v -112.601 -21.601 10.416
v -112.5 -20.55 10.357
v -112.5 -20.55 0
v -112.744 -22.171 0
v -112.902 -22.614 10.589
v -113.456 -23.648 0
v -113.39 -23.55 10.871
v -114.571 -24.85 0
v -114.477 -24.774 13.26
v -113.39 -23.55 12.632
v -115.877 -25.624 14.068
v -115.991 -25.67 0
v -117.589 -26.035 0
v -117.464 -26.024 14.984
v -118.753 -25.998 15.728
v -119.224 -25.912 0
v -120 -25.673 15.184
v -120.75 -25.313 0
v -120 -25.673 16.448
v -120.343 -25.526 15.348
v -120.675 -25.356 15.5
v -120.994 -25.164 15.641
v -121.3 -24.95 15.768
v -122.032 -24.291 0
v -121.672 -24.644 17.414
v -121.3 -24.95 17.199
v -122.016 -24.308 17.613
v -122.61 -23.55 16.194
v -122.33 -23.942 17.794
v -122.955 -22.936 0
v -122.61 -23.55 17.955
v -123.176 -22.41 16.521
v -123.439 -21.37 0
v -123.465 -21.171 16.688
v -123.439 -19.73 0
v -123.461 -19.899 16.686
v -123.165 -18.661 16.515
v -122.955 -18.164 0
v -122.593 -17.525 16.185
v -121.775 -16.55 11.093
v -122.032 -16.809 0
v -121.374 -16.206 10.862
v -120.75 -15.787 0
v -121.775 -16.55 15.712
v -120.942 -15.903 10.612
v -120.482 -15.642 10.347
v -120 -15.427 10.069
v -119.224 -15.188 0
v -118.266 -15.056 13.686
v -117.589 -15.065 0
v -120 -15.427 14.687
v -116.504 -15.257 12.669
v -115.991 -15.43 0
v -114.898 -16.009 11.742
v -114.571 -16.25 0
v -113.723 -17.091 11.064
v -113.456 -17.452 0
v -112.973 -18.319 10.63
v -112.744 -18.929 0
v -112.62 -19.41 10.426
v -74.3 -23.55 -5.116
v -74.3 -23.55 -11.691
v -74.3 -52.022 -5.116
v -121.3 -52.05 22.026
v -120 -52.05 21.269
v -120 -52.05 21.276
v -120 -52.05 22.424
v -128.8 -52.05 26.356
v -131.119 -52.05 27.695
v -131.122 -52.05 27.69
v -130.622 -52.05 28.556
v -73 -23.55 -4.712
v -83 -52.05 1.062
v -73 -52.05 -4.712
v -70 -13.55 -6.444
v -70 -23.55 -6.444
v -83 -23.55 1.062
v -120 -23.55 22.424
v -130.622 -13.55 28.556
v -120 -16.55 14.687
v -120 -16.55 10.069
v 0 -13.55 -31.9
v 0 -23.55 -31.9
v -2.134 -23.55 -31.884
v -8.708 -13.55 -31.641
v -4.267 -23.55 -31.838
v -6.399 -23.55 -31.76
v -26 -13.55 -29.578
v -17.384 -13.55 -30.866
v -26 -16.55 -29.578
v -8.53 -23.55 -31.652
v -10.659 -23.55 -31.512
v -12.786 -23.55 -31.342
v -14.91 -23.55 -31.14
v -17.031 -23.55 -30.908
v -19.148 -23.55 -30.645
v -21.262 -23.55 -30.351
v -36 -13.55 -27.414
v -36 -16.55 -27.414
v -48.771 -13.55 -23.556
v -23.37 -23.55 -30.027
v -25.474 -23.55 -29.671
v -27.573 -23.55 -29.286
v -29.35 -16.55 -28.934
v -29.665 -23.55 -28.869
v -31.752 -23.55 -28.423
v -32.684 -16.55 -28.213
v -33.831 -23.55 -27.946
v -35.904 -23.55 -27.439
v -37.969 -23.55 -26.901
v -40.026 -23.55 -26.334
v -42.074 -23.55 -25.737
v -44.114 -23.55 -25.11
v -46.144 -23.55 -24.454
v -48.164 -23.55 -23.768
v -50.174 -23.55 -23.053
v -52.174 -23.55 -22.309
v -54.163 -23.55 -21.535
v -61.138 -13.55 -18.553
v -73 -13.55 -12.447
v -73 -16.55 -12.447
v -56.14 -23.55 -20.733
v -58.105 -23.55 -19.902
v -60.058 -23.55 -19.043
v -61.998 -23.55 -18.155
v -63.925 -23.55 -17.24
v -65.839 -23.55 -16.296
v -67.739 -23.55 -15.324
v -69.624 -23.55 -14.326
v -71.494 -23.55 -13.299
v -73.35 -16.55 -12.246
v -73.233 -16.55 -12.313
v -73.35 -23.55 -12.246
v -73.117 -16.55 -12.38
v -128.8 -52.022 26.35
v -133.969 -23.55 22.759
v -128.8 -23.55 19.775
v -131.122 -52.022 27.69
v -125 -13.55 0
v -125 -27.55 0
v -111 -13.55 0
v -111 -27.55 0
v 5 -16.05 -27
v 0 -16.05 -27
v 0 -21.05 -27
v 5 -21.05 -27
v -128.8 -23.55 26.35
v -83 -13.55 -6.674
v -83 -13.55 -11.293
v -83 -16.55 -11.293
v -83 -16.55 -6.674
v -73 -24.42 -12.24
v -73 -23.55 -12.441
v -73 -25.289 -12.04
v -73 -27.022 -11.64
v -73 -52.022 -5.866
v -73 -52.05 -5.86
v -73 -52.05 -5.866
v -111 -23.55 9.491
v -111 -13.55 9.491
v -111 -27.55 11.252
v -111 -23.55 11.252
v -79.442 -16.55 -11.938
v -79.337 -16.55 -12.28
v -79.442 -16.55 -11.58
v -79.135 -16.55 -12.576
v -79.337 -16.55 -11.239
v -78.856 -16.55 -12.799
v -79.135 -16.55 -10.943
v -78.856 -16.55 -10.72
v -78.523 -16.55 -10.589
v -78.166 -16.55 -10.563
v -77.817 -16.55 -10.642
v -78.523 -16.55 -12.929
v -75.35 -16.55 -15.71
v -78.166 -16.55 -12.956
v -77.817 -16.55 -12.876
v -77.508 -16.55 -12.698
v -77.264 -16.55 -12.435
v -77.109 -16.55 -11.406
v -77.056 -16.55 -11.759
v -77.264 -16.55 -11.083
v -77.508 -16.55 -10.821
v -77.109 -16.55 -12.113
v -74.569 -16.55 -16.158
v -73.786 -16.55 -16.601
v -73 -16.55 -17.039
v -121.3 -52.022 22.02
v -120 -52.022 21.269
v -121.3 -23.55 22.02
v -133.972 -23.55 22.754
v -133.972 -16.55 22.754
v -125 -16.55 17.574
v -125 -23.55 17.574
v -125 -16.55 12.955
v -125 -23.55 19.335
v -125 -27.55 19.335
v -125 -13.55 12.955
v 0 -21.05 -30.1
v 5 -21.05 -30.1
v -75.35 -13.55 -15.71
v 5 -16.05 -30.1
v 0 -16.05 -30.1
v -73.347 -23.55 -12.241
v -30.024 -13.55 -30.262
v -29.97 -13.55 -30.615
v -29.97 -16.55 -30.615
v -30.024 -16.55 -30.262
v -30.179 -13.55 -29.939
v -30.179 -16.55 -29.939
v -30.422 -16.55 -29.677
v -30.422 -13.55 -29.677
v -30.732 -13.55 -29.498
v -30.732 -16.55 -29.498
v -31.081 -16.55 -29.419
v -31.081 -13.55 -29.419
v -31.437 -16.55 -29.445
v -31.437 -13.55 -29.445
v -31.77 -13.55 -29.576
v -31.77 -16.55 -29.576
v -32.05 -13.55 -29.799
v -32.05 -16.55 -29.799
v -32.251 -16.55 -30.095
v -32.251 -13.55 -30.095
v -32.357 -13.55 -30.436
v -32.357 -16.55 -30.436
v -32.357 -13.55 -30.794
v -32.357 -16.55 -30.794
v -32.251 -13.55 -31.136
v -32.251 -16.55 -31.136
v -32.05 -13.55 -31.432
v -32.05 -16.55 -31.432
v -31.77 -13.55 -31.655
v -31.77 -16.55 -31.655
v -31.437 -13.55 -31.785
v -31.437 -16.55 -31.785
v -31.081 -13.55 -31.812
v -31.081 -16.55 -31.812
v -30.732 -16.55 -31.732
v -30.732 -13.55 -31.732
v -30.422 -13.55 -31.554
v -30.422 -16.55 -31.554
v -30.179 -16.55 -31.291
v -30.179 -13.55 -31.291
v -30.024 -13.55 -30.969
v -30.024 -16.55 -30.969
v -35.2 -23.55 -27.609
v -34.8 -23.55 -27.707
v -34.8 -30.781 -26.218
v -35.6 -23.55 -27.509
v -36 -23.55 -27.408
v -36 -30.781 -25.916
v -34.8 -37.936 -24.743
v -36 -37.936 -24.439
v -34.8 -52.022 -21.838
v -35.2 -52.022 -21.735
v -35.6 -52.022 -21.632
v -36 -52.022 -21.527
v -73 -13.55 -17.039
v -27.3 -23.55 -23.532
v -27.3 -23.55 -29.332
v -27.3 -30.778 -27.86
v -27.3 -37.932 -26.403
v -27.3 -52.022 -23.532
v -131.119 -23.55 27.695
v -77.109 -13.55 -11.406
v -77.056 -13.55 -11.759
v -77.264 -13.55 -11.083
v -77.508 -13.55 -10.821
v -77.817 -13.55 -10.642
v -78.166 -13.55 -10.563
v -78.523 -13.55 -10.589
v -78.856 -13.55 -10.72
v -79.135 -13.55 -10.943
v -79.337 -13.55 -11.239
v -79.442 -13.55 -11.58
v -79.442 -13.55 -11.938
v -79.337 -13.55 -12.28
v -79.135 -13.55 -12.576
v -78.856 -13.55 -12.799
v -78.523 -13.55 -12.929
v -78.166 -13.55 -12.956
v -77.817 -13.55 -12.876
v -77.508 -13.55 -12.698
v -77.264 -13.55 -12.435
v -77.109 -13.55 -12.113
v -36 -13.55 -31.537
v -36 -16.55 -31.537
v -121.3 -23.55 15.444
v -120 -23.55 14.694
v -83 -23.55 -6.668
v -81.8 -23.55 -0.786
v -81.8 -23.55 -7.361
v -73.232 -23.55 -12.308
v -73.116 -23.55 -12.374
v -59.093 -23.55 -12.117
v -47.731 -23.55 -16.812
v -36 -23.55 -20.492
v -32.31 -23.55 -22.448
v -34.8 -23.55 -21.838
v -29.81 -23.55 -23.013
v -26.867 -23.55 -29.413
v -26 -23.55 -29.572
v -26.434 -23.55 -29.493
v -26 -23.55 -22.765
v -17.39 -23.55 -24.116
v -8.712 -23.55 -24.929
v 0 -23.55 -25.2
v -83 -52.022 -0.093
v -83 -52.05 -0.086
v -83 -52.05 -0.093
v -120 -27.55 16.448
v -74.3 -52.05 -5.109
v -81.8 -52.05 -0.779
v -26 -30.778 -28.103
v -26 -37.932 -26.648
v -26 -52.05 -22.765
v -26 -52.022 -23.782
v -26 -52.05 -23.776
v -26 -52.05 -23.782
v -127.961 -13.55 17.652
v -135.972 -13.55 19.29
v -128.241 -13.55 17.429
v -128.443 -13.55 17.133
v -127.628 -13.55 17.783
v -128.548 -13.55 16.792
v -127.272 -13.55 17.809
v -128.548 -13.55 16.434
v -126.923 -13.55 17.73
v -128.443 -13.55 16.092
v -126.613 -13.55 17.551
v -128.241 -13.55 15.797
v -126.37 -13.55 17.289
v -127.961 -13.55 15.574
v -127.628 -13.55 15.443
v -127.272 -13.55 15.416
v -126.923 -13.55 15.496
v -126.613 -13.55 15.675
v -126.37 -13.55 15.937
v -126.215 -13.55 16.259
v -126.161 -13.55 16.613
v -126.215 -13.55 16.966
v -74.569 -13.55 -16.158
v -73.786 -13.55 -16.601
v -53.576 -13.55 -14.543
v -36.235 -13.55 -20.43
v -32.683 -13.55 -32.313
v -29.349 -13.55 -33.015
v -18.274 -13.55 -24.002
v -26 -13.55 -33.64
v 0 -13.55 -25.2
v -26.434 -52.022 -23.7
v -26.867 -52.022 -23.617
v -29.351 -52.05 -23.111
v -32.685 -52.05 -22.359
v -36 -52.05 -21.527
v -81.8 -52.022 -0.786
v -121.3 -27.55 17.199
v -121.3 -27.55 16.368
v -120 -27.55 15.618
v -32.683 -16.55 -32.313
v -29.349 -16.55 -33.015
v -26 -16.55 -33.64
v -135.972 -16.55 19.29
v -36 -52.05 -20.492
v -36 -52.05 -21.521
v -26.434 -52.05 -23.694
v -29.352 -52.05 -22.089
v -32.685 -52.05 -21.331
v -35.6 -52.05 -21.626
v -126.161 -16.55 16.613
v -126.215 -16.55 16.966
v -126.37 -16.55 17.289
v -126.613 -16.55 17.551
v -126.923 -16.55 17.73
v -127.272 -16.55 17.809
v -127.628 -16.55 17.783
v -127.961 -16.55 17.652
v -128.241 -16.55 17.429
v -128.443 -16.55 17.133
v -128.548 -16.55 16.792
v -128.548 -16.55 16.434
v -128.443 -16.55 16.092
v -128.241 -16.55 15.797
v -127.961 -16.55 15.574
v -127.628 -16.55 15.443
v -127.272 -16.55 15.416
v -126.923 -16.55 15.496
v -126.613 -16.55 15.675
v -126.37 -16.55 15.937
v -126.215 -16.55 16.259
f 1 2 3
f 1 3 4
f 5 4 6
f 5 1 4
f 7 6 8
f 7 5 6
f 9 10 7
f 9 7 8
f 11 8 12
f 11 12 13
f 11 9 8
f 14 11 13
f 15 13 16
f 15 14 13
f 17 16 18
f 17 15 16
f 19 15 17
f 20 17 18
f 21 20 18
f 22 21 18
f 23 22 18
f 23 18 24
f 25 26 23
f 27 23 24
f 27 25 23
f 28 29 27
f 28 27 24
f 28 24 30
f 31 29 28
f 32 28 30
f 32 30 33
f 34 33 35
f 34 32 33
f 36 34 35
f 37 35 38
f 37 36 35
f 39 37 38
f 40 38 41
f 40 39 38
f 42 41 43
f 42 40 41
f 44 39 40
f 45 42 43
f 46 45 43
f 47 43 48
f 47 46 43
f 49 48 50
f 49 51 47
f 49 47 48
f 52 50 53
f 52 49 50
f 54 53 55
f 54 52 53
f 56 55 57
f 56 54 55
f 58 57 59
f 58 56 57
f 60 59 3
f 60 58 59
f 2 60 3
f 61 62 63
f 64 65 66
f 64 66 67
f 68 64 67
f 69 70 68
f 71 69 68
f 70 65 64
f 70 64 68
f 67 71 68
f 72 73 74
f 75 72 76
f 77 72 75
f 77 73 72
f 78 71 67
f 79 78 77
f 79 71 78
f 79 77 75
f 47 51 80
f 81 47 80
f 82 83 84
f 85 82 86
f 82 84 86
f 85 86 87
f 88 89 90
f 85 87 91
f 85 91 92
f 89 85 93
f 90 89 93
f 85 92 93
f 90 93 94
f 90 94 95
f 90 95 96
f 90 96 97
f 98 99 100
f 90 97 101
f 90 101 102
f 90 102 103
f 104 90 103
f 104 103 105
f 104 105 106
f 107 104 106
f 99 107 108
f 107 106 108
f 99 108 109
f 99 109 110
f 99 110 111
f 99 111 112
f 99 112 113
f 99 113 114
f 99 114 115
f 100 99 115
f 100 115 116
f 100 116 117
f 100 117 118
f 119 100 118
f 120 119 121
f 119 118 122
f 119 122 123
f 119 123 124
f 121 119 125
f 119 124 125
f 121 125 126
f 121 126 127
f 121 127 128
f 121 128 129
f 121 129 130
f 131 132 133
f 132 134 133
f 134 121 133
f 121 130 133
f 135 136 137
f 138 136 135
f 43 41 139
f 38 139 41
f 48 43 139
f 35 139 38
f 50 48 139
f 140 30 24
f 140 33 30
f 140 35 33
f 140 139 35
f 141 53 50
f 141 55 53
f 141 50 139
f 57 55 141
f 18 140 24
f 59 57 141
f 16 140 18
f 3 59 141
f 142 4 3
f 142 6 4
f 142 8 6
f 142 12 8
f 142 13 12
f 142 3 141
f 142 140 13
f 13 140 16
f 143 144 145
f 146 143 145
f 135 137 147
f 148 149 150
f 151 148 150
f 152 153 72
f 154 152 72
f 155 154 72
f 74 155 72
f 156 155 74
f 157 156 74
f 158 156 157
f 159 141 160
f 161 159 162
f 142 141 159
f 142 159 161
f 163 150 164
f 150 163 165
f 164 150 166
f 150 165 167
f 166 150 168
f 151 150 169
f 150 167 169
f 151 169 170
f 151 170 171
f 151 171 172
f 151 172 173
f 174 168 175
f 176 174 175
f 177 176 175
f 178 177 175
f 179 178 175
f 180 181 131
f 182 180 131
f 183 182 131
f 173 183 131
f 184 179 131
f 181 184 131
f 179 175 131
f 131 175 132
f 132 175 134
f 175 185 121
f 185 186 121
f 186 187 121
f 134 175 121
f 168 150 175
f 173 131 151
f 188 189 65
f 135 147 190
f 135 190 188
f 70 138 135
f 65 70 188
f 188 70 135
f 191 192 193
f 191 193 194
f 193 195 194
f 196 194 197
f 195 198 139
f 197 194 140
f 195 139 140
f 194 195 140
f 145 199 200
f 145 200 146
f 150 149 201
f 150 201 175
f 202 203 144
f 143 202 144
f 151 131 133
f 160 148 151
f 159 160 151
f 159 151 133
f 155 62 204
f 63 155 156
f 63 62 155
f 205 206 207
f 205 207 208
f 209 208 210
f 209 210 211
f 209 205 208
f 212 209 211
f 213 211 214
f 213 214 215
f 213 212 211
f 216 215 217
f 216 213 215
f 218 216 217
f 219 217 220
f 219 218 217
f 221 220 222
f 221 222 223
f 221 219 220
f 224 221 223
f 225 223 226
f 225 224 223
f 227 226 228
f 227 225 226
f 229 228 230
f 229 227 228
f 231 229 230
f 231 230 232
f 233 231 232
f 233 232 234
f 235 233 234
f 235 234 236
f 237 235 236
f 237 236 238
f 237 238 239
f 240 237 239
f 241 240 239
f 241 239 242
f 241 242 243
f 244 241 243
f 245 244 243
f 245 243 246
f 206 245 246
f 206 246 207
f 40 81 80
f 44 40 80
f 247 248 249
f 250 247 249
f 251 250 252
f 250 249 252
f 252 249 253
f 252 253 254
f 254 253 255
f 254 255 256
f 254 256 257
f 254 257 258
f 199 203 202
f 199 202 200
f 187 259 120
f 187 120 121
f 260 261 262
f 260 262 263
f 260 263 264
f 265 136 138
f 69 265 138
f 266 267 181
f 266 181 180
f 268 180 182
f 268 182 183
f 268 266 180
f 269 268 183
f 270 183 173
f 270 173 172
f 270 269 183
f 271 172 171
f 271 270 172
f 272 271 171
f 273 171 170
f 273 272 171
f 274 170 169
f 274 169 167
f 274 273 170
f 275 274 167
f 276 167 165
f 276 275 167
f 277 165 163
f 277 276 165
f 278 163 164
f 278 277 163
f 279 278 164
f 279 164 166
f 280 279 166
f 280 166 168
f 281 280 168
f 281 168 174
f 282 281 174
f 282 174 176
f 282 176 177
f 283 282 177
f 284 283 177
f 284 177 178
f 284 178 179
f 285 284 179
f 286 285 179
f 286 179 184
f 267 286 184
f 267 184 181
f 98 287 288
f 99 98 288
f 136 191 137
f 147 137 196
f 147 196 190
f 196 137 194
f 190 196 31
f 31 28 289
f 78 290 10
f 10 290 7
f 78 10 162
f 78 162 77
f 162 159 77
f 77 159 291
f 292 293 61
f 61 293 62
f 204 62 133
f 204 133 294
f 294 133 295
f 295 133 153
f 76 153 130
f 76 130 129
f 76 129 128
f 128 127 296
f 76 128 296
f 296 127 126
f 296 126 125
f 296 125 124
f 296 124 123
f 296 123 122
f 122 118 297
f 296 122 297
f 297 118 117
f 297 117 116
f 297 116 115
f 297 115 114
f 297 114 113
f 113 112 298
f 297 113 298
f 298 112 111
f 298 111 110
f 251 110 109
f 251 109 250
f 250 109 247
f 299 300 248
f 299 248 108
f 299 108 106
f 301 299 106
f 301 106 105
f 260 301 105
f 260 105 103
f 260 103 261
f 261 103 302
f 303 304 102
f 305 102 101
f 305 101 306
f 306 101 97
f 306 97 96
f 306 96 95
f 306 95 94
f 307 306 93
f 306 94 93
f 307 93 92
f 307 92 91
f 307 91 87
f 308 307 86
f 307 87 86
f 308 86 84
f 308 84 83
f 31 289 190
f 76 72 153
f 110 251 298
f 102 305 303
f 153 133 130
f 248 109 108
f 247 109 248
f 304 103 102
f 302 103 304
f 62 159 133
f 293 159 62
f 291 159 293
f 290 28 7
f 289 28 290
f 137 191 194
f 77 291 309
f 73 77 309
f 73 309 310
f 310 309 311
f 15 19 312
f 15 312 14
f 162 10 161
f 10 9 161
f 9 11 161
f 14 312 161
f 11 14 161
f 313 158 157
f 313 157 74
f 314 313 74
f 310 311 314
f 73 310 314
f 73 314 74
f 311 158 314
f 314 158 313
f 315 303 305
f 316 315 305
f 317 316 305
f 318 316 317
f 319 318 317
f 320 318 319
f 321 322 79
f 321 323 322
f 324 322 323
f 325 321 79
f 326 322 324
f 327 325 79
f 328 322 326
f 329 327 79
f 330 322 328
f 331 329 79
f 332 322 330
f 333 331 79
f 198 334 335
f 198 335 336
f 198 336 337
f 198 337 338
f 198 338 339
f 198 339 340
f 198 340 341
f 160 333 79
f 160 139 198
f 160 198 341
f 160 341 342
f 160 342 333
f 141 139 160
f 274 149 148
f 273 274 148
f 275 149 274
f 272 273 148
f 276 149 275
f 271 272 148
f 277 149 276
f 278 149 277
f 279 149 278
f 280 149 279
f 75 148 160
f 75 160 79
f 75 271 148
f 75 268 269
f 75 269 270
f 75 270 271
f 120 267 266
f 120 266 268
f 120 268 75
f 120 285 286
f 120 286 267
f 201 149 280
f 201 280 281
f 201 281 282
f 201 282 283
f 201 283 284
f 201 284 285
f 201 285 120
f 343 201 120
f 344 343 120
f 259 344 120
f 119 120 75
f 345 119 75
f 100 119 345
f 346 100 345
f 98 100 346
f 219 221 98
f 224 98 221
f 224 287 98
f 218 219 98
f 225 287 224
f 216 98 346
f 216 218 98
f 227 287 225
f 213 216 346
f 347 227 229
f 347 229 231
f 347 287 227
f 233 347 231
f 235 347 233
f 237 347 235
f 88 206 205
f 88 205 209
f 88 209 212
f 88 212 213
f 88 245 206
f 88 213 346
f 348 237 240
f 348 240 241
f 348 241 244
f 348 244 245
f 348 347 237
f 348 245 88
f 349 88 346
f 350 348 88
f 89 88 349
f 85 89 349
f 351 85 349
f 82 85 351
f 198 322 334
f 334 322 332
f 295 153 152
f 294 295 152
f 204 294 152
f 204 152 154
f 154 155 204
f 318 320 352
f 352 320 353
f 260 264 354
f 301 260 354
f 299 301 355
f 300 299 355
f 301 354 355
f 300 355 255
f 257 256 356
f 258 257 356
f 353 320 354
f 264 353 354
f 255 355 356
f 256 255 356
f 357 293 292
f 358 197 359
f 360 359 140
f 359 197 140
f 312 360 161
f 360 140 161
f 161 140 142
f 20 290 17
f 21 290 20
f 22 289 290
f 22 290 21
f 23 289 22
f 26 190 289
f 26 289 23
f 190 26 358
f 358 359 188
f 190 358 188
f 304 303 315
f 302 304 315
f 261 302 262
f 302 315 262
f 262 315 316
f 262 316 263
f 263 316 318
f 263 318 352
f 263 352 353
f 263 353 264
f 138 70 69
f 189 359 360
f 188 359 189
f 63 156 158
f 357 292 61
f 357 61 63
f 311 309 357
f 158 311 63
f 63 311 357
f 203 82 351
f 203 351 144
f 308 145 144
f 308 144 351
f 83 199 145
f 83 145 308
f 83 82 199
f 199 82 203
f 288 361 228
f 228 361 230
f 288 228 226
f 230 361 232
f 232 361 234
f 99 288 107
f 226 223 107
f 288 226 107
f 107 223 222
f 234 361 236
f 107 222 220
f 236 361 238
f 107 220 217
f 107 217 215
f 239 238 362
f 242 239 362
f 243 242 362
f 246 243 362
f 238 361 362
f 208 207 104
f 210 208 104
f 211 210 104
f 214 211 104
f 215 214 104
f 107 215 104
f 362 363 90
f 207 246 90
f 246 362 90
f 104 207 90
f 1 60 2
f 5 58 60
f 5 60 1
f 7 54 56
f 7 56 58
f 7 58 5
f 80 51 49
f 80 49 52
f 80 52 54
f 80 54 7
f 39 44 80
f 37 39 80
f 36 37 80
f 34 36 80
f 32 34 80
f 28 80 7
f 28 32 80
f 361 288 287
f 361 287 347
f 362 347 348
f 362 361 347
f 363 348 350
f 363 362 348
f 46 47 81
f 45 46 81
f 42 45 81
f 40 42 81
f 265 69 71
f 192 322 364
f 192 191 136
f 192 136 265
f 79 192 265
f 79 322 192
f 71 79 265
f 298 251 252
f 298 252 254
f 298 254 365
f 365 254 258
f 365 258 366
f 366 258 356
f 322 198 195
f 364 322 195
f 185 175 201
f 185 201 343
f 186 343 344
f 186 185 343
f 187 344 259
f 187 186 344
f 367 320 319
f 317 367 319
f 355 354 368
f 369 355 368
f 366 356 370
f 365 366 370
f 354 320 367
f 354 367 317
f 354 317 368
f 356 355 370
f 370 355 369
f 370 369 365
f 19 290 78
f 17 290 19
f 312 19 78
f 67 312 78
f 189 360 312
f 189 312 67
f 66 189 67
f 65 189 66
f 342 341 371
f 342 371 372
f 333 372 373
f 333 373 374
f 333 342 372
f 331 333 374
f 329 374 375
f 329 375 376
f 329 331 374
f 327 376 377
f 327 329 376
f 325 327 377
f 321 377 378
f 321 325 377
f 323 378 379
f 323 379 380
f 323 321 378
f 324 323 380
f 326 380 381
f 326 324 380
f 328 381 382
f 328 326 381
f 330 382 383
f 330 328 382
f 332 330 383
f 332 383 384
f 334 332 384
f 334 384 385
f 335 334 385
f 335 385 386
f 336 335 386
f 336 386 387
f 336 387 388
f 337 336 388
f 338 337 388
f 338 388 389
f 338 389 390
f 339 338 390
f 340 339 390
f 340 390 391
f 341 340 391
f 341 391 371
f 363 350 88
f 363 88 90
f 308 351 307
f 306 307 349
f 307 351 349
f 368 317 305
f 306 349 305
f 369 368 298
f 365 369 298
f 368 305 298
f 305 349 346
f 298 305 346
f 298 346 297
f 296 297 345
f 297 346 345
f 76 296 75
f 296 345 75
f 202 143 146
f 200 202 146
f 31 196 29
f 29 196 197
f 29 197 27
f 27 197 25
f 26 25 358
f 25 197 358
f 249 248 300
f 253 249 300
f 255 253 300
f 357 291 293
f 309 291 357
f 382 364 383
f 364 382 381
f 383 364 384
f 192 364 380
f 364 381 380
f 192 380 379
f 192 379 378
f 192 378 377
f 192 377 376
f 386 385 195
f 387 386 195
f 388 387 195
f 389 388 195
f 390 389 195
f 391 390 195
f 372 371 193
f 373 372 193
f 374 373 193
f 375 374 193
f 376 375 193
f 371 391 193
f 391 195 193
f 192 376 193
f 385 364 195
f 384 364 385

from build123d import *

# Parameters (mm, degrees)
BOX010_W               = 200
BOX010_H               = 100
BOX010_DEPTH           = 100
BOX008_W               = 20
BOX008_H               = 20
BOX008_DEPTH           = 20
BOX008_PLACEMENT_ANGLE = 30
BOX011_W               = 14
BOX011_H               = 14
BOX011_DEPTH           = 20
SKETCH039_R            = 5.5
POCKET007_DEPTH        = 20.001
BOX014_W               = 7.5
BOX014_H               = 60
BOX014_DEPTH           = 200
ARRAY002_X_COUNT       = 7
ARRAY002_X_PITCH       = 47
BOX006_W               = 37
BOX006_H               = 60
BOX006_DEPTH           = 200
ARRAY_X_COUNT          = 6
ARRAY_X_PITCH          = 47
BOX012_W               = 14
BOX012_H               = 14
BOX012_DEPTH           = 12
SKETCH032_R            = 5.5
POCKET009_DEPTH        = 12.001
BOX013_W               = 14
BOX013_H               = 14
BOX013_DEPTH           = 12
SKETCH034_R            = 5.5
POCKET008_DEPTH        = 12.001
BOX009_W               = 37
BOX009_H               = 60
BOX009_DEPTH           = 200
ARRAY001_X_COUNT       = 6
ARRAY001_X_PITCH       = 47
SKETCH035_W            = 3
SKETCH035_H            = 4
SKETCH036_R            = 1.2
POCKET006_DEPTH        = 3.001
SKETCH037_W            = 5
SKETCH037_H            = 3.1
PAD022_DEPTH           = 5


with BuildPart() as bigleft:
    # Box010 → Box010 (new body)
    with BuildSketch(Plane(origin=(0, -50, -50), x_dir=(1, 0, 0), z_dir=(0, 0, 1))):
        with Locations((100, 50)):
            Rectangle(BOX010_W, BOX010_H)
    extrude(amount=BOX010_DEPTH)


with BuildPart() as pillar_cut_cube_l:
    # Box008 → Box008 (new body)
    with BuildSketch(Plane.XY):
        with Locations((10, 10)):
            Rectangle(BOX008_W, BOX008_H)
    extrude(amount=BOX008_DEPTH)


with BuildPart() as pillar_cut_cube_l_1:
    # Box008 placement: moved
    add(pillar_cut_cube_l.part.moved(Location((-127.001, 5, 20.4905))).rotate(Axis((-127.001, 5, 20.4905), (0, 1, 0)), BOX008_PLACEMENT_ANGLE))


with BuildPart() as cut011:
    # Box011 → Box011 (new body)
    with BuildSketch(Plane(origin=(-125, 8.55, 0), x_dir=(1, 0, 0), z_dir=(0, 0, 1))):
        with Locations((7, 7)):
            Rectangle(BOX011_W, BOX011_H)
    extrude(amount=BOX011_DEPTH)

    # Sketch039 → Pocket007 (cut, through all)
    with BuildSketch(Plane(origin=(-125, 8.55, 20), x_dir=(1, 0, 0), z_dir=(0, 0, 1))):
        with Locations((7, 7)):
            Circle(SKETCH039_R)
    extrude(amount=-POCKET007_DEPTH, mode=Mode.SUBTRACT)

    # Cut011: cut pillar_cut_cube_l
    add(pillar_cut_cube_l_1.part, mode=Mode.SUBTRACT)


with BuildPart() as array002:
    # Box014 → Box014 (new body)
    with BuildSketch(Plane(origin=(-128.8, 18.55, -100), x_dir=(1, 0, 0), z_dir=(0, 0, 1))):
        with Locations((3.75, 30)):
            Rectangle(BOX014_W, BOX014_H)
    extrude(amount=BOX014_DEPTH)

    # Array002 X: Array002 ×7


with BuildPart() as array002_1:
    add(array002.part)
    with Locations(*[(i * ARRAY002_X_PITCH, 0, 0) for i in range(1, ARRAY002_X_COUNT)]):
        add(array002.part)


with BuildPart() as rail_cut_cube_array_b:
    # Box006 → Box006 (new body)
    with BuildSketch(Plane(origin=(-120, 18.55, -100), x_dir=(1, 0, 0), z_dir=(0, 0, 1))):
        with Locations((18.5, 30)):
            Rectangle(BOX006_W, BOX006_H)
    extrude(amount=BOX006_DEPTH)

    # Array X: rail_cut_cube_array_b ×6


with BuildPart() as rail_cut_cube_array_b_1:
    add(rail_cut_cube_array_b.part)
    with Locations(*[(i * ARRAY_X_PITCH, 0, 0) for i in range(1, ARRAY_X_COUNT)]):
        add(rail_cut_cube_array_b.part)


with BuildPart() as cut013:
    # Sweep002: sweep along a path in Sketch028
    with BuildLine(Plane.XZ) as sweep002_path:
        Line((164.641016, 24.27441), (144.641016, 24.27441))
        ThreePointArc((144.641016, 24.27441), (123.935493, 21.548477), (104.641016, 13.556443))
        Line((104.641016, 13.556443), (70, -6.443557))
        ThreePointArc((70, -6.443557), (0, -25.2), (-70, -6.443557))
        Line((-70, -6.443557), (-130.621778, 28.556443))
    # Sketch043 → Sweep002 (sweep)
    with BuildSketch(Plane.YZ.offset(164.641016)):
        Polygon((18.55, 17.58), (47.05, 23.28), (18.55, 23.28), align=None)
    sweep(path=sweep002_path.line)

    # Cut012: cut rail_cut_cube_array_b
    add(rail_cut_cube_array_b_1.part, mode=Mode.SUBTRACT)

    # Cut013: cut Array002
    add(array002_1.part, mode=Mode.SUBTRACT)


with BuildPart() as rail_cut_b:
    # Sweep: sweep along a path in Sketch028
    with BuildLine(Plane.XZ) as sweep_path:
        Line((164.641016, 24.27441), (144.641016, 24.27441))
        ThreePointArc((144.641016, 24.27441), (123.935493, 21.548477), (104.641016, 13.556443))
        Line((104.641016, 13.556443), (70, -6.443557))
        ThreePointArc((70, -6.443557), (0, -25.2), (-70, -6.443557))
        Line((-70, -6.443557), (-130.621778, 28.556443))
    # Sketch029 → Sweep (sweep)
    with BuildSketch(Plane.YZ):
        Polygon((-19.25, -25.2), (-19.25, -31.9), (-9.25, -31.9), (-9.25, -26.2), (19.25, -26.2), (19.25, -25.2), align=None)
    sweep(path=sweep_path.line)


with BuildPart() as rail_cut_b_1:
    # Sweep placement: moved
    add(rail_cut_b.part.moved(Location((0, 27.8, 0))))

    # Cut007: cut rail_cut_cube_array_b
    add(rail_cut_cube_array_b_1.part, mode=Mode.SUBTRACT)


with BuildPart() as pillar_hollow_r:
    # Box012 → Box012 (new body)
    with BuildSketch(Plane(origin=(143, 8.55, 7), x_dir=(1, 0, 0), z_dir=(0, 0, 1))):
        with Locations((7, 7)):
            Rectangle(BOX012_W, BOX012_H)
    extrude(amount=BOX012_DEPTH)

    # Sketch032 → Pocket009 (cut, through all)
    with BuildSketch(Plane(origin=(143, 8.55, 19), x_dir=(1, 0, 0), z_dir=(0, 0, 1))):
        with Locations((7, 7)):
            Circle(SKETCH032_R)
    extrude(amount=-POCKET009_DEPTH, mode=Mode.SUBTRACT)


with BuildPart() as pillar_hollow_m:
    # Box013 → Box013 (new body)
    with BuildSketch(Plane(origin=(18, 8.55, -40), x_dir=(1, 0, 0), z_dir=(0, 0, 1))):
        with Locations((7, 7)):
            Rectangle(BOX013_W, BOX013_H)
    extrude(amount=BOX013_DEPTH)

    # Sketch034 → Pocket008 (cut, through all)
    with BuildSketch(Plane(origin=(18, 8.55, -28), x_dir=(1, 0, 0), z_dir=(0, 0, 1))):
        with Locations((7, 7)):
            Circle(SKETCH034_R)
    extrude(amount=-POCKET008_DEPTH, mode=Mode.SUBTRACT)


with BuildPart() as mount_cube_array_b:
    # Box009 → Box009 (new body)
    with BuildSketch(Plane(origin=(-120, 18.55, -100), x_dir=(1, 0, 0), z_dir=(0, 0, 1))):
        with Locations((18.5, 30)):
            Rectangle(BOX009_W, BOX009_H)
    extrude(amount=BOX009_DEPTH)

    # Array001 X: mount_cube_array_b ×6


with BuildPart() as mount_cube_array_b_1:
    add(mount_cube_array_b.part)
    with Locations(*[(i * ARRAY001_X_PITCH, 0, 0) for i in range(1, ARRAY001_X_COUNT)]):
        add(mount_cube_array_b.part)


with BuildPart() as mount_cube_array_b_2:
    # Array001 placement: moved
    add(mount_cube_array_b_1.part.moved(Location((0, -30, 0))))


with BuildPart() as cut014:
    # Sweep001: sweep along a path in Sketch028
    with BuildLine(Plane.XZ) as sweep001_path:
        Line((-130.621778, 28.556443), (-70, -6.443557))
        ThreePointArc((-70, -6.443557), (0, -25.2), (70, -6.443557))
        Line((70, -6.443557), (104.641016, 13.556443))
        ThreePointArc((104.641016, 13.556443), (123.935493, 21.548477), (144.641016, 24.27441))
        Line((144.641016, 24.27441), (164.641016, 24.27441))
    # Sketch035 → Sweep001 (sweep)
    with BuildSketch(Plane.YZ):
        with Locations((-17.75, -33.9)):
            Rectangle(SKETCH035_W, SKETCH035_H)
    sweep(path=sweep001_path.line)


with BuildPart() as cut014_1:
    # Sweep001 placement: moved
    add(cut014.part.moved(Location((0, 27.8, 0))))

    # Sketch036 → Pocket006 (cut, through all)
    with BuildSketch(Plane.XZ.offset(-8.55)):
        with Locations((-127.361382, 16.612761)):
            Circle(SKETCH036_R)
        with Locations((-78.25576, -11.759304)):
            Circle(SKETCH036_R)
        with Locations((-31.170284, -30.615305)):
            Circle(SKETCH036_R)
        with Locations((15.982787, -32.973976)):
            Circle(SKETCH036_R)
        with Locations((62.801571, -19.921701)):
            Circle(SKETCH036_R)
        with Locations((109.81105, 6.487408)):
            Circle(SKETCH036_R)
        with Locations((158.314011, 15.583238)):
            Circle(SKETCH036_R)
    extrude(amount=-POCKET006_DEPTH, mode=Mode.SUBTRACT)

    # Cut010: cut mount_cube_array_b
    add(mount_cube_array_b_2.part, mode=Mode.SUBTRACT)

    # Fusion003: union Cut011, Cut013, rail_cut_b, pillar_hollow_r, pillar_hollow_m
    add(cut011.part)
    add(cut013.part)
    add(rail_cut_b_1.part)
    add(pillar_hollow_r.part)
    add(pillar_hollow_m.part)

    # Cut014: cut bigleft
    add(bigleft.part, mode=Mode.SUBTRACT)


with BuildPart() as clone_of_fusion004:
    # Sketch037 → Pad022 (new body)
    with BuildSketch(Plane.YZ):
        with Locations((13.55, -28.55)):
            Rectangle(SKETCH037_W, SKETCH037_H)
    extrude(amount=PAD022_DEPTH)

    # Fusion004: union Cut014
    add(cut014_1.part)


with BuildPart() as rail_fl:
    # Part__Mirroring: instance of Clone of Fusion004
    add(clone_of_fusion004.part.mirror(Plane(origin=(0, 0, 0), x_dir=(1, 0, 0), z_dir=(0, 1, 0))))


with BuildPart() as rail_fl_1:
    # Part__Mirroring placement: moved
    add(rail_fl.part.moved(Location((0, -5, 0))))


solid = rail_fl_1.part
